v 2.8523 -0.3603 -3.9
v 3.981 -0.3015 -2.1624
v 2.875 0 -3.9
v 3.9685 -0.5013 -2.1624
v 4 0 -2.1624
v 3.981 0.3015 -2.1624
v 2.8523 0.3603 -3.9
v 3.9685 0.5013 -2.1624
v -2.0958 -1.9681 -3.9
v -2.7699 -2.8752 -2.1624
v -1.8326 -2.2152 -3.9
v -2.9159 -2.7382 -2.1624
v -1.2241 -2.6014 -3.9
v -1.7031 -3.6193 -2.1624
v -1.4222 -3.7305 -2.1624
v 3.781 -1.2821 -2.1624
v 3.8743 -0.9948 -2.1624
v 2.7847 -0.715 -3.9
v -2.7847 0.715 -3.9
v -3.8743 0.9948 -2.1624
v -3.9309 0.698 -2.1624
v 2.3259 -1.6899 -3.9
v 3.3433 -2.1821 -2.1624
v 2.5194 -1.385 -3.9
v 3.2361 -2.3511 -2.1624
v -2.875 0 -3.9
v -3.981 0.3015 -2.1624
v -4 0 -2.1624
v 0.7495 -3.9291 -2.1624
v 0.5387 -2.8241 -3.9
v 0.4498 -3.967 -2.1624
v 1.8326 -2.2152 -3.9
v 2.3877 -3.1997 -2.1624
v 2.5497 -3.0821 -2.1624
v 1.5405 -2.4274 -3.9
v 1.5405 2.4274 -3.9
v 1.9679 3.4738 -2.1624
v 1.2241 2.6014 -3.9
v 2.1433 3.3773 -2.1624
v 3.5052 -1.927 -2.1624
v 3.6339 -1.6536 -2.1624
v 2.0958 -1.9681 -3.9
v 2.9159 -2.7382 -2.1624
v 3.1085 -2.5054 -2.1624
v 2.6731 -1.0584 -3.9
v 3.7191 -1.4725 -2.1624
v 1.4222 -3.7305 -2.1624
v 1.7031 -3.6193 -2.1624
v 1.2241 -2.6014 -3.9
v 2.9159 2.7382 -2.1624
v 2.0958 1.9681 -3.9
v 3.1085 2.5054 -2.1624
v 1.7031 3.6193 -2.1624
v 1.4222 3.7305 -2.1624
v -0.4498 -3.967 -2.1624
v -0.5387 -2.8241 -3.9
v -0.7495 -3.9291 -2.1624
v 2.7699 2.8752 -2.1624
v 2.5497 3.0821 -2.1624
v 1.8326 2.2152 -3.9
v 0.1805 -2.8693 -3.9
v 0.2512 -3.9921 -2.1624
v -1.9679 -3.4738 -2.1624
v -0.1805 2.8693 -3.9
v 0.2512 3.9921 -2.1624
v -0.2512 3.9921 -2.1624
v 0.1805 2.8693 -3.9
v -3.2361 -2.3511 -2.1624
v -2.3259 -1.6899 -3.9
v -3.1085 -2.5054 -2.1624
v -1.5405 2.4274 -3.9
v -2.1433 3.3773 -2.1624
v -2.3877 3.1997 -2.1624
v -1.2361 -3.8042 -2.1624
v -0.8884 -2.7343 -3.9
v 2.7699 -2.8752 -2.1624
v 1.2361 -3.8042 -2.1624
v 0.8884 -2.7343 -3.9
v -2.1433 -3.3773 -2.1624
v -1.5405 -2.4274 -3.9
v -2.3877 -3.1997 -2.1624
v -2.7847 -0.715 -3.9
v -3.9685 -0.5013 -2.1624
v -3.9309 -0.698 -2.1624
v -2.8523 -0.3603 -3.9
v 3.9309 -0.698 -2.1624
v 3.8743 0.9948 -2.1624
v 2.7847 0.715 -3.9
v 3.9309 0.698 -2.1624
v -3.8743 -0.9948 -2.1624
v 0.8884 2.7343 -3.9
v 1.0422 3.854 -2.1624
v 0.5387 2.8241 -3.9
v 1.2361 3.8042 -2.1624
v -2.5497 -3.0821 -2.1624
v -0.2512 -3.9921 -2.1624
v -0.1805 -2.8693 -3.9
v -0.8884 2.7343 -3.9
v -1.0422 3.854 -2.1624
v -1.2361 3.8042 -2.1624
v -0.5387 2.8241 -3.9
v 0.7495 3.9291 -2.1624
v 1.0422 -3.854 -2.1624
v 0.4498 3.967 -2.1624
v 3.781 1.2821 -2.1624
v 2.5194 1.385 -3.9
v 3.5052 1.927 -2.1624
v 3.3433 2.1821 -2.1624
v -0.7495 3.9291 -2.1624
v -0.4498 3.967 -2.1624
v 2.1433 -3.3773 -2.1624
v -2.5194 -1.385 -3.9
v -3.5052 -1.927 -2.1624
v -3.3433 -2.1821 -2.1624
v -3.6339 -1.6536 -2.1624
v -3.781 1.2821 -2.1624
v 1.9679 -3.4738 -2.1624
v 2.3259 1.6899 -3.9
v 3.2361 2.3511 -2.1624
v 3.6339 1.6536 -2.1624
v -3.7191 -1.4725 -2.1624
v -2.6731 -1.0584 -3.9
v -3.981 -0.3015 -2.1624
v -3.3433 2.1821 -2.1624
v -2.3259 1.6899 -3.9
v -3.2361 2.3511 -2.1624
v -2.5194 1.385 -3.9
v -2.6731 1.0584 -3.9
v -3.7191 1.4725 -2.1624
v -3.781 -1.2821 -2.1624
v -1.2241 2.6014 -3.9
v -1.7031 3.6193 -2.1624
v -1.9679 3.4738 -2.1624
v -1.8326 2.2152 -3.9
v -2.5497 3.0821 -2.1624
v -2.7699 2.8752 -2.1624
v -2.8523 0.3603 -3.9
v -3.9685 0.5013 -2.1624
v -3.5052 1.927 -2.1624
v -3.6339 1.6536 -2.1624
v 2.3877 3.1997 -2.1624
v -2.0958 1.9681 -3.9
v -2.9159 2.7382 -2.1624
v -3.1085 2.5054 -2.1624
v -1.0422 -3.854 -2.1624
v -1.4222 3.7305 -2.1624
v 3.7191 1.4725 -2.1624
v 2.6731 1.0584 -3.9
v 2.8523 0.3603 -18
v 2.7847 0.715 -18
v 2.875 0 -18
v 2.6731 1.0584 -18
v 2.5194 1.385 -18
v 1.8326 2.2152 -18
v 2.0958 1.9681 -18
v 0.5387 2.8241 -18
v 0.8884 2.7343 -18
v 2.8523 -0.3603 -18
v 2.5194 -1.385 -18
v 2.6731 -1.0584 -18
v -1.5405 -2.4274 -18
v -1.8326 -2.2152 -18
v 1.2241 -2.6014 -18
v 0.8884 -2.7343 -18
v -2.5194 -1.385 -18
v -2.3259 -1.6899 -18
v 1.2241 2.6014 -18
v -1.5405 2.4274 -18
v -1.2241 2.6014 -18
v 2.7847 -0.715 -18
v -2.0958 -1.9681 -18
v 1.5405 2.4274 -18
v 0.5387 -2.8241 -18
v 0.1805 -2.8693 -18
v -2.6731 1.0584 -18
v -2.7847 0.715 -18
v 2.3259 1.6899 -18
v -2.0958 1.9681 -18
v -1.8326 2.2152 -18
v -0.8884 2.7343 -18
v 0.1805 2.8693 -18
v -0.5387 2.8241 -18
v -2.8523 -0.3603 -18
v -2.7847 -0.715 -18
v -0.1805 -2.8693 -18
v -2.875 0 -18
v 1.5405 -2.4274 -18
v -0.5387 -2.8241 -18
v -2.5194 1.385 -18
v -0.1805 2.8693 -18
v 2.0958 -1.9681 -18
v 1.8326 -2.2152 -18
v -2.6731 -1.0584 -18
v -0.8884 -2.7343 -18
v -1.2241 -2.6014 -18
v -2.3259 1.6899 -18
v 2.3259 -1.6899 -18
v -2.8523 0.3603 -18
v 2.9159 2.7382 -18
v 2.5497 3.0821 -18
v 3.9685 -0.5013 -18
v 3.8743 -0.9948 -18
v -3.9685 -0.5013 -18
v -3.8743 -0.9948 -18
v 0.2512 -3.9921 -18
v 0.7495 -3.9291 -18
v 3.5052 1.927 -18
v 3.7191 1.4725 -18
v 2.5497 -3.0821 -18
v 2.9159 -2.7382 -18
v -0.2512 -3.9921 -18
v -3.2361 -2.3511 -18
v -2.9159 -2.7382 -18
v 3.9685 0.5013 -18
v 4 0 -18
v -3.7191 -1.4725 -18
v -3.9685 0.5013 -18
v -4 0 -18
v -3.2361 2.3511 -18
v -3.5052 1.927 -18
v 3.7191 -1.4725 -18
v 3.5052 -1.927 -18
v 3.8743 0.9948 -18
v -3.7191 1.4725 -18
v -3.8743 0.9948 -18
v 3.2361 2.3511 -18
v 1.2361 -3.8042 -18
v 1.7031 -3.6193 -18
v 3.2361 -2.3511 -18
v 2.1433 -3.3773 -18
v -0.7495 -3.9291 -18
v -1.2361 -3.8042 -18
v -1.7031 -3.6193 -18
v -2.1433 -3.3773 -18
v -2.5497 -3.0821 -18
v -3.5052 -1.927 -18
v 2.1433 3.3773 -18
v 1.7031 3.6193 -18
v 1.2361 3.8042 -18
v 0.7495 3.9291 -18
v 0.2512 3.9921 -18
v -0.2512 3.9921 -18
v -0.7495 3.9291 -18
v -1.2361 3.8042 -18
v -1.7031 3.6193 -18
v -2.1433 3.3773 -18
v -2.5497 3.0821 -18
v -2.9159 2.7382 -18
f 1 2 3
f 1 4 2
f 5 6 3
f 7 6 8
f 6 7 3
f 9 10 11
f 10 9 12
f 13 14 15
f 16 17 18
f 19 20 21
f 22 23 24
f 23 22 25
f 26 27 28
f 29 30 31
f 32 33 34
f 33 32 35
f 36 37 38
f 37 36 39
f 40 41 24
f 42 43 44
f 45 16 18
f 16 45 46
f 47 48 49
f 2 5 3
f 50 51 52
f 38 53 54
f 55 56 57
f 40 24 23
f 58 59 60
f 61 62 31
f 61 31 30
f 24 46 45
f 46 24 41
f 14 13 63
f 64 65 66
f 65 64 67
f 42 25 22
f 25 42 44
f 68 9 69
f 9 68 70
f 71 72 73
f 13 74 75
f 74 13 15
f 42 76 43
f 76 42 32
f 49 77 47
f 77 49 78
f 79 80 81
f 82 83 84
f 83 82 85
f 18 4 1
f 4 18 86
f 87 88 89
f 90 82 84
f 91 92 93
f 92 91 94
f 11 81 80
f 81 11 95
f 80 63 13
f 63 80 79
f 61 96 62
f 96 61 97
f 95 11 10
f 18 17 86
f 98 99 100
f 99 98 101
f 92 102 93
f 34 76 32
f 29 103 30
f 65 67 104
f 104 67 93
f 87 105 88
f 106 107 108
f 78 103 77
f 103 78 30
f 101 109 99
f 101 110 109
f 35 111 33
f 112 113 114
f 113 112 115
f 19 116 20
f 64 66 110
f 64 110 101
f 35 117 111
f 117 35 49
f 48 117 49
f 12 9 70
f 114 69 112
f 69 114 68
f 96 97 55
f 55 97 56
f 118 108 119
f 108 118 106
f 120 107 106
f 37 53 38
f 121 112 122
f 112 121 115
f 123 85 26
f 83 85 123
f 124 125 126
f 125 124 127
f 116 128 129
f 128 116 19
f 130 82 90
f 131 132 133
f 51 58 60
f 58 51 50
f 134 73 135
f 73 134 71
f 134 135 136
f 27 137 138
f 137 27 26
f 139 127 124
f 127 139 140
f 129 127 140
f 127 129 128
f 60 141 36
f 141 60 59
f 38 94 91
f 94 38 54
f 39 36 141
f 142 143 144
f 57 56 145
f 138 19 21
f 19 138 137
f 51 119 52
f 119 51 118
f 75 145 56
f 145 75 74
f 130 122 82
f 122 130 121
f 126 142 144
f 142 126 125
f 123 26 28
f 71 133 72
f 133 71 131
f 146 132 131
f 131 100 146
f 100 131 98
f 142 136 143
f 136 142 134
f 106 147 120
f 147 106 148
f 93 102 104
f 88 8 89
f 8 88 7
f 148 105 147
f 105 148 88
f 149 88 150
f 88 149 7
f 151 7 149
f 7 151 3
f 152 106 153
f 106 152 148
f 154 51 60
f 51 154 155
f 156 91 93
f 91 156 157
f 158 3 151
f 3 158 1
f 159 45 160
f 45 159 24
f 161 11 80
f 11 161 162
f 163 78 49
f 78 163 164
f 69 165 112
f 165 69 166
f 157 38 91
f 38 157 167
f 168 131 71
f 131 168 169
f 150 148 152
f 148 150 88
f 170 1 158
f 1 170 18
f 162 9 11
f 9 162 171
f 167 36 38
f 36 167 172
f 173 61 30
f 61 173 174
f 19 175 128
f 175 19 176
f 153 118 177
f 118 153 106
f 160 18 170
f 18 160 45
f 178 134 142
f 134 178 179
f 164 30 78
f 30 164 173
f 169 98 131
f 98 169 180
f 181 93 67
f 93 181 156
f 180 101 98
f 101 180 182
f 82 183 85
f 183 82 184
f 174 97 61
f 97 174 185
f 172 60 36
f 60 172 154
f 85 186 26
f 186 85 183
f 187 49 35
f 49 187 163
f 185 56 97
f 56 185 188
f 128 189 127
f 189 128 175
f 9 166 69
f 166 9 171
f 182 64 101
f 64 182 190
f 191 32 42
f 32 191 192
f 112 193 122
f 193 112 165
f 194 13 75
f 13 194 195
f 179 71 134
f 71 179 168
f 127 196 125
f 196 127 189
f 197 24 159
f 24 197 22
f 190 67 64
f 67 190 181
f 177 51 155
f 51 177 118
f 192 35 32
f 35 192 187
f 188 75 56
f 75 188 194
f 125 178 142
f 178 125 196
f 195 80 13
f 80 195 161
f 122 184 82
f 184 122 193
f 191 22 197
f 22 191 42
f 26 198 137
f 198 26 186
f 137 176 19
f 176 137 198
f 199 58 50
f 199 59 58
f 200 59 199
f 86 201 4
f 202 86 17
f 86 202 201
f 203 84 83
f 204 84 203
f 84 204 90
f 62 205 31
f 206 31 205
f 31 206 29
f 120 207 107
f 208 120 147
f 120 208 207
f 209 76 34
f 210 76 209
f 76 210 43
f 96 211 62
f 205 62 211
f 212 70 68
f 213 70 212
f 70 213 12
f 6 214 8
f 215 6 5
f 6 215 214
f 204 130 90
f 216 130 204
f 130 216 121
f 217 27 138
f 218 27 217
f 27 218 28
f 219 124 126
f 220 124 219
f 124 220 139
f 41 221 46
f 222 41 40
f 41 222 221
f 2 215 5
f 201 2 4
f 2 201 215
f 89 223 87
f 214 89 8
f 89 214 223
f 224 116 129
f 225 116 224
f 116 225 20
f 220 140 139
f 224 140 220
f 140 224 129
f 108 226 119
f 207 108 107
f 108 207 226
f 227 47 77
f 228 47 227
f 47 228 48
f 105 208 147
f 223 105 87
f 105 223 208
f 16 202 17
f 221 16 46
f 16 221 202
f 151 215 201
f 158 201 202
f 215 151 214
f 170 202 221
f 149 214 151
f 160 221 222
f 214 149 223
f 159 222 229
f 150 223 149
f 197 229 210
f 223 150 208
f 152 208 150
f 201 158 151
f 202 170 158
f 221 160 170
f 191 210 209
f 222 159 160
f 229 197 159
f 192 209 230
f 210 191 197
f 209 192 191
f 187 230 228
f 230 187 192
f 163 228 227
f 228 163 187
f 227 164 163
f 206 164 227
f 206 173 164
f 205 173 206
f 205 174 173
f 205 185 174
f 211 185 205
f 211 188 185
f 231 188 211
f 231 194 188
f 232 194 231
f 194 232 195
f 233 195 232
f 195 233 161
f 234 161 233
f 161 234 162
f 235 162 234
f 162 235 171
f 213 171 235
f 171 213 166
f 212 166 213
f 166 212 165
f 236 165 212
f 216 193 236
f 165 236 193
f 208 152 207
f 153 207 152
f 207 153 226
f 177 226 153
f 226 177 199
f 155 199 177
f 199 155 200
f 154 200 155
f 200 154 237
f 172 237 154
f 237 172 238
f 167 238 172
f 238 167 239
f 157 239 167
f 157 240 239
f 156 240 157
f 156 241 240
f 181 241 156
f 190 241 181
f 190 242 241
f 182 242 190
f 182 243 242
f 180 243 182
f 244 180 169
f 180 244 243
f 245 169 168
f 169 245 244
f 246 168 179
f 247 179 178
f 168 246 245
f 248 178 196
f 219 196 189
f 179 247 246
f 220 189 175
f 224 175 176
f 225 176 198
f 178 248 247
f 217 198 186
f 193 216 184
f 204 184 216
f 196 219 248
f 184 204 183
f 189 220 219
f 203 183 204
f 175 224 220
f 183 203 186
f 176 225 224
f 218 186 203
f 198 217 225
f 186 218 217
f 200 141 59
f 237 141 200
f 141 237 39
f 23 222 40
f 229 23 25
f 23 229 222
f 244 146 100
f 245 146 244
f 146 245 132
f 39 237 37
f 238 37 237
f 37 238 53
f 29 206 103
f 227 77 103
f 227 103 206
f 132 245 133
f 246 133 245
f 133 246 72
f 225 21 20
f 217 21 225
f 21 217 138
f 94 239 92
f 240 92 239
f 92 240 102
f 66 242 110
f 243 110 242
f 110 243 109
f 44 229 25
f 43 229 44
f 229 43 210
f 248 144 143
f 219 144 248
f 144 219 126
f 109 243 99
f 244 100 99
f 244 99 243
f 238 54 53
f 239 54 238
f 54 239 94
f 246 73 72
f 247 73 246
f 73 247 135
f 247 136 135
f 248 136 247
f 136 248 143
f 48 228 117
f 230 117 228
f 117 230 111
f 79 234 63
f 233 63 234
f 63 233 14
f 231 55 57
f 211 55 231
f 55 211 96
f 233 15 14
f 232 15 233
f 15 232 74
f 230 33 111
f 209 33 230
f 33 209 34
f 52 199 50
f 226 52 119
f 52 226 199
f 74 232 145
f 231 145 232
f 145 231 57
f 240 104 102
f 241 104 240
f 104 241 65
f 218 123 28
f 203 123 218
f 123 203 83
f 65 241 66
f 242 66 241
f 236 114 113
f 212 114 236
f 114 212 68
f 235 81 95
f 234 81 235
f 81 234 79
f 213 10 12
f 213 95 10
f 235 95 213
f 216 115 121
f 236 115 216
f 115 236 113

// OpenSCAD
$fn = 50;

difference() {
	union() {
		translate(v = [0, 0, -18.0]) {
			cylinder(h = 21, r = 4.0);
		}
	}
	union() {
		translate(v = [0, 0, 0]) {
			rotate(a = [0, 0, 0]) {
				difference() {
					union() {
						translate(v = [0, 0, -21.0]) {
							cylinder(h = 21, r = 2.6);
						}
						translate(v = [0, 0, -3.9]) {
							cylinder(h = 3.9, r1 = 2.875, r2 = 5.4);
						}
						translate(v = [0, 0, -21.0]) {
							cylinder(h = 21, r = 2.875);
						}
						translate(v = [0, 0, -21.0]) {
							cylinder(h = 21, r = 2.6);
						}
					}
					union();
				}
			}
		}
		#cylinder(h = 3, r = 5.0);
	}
}
